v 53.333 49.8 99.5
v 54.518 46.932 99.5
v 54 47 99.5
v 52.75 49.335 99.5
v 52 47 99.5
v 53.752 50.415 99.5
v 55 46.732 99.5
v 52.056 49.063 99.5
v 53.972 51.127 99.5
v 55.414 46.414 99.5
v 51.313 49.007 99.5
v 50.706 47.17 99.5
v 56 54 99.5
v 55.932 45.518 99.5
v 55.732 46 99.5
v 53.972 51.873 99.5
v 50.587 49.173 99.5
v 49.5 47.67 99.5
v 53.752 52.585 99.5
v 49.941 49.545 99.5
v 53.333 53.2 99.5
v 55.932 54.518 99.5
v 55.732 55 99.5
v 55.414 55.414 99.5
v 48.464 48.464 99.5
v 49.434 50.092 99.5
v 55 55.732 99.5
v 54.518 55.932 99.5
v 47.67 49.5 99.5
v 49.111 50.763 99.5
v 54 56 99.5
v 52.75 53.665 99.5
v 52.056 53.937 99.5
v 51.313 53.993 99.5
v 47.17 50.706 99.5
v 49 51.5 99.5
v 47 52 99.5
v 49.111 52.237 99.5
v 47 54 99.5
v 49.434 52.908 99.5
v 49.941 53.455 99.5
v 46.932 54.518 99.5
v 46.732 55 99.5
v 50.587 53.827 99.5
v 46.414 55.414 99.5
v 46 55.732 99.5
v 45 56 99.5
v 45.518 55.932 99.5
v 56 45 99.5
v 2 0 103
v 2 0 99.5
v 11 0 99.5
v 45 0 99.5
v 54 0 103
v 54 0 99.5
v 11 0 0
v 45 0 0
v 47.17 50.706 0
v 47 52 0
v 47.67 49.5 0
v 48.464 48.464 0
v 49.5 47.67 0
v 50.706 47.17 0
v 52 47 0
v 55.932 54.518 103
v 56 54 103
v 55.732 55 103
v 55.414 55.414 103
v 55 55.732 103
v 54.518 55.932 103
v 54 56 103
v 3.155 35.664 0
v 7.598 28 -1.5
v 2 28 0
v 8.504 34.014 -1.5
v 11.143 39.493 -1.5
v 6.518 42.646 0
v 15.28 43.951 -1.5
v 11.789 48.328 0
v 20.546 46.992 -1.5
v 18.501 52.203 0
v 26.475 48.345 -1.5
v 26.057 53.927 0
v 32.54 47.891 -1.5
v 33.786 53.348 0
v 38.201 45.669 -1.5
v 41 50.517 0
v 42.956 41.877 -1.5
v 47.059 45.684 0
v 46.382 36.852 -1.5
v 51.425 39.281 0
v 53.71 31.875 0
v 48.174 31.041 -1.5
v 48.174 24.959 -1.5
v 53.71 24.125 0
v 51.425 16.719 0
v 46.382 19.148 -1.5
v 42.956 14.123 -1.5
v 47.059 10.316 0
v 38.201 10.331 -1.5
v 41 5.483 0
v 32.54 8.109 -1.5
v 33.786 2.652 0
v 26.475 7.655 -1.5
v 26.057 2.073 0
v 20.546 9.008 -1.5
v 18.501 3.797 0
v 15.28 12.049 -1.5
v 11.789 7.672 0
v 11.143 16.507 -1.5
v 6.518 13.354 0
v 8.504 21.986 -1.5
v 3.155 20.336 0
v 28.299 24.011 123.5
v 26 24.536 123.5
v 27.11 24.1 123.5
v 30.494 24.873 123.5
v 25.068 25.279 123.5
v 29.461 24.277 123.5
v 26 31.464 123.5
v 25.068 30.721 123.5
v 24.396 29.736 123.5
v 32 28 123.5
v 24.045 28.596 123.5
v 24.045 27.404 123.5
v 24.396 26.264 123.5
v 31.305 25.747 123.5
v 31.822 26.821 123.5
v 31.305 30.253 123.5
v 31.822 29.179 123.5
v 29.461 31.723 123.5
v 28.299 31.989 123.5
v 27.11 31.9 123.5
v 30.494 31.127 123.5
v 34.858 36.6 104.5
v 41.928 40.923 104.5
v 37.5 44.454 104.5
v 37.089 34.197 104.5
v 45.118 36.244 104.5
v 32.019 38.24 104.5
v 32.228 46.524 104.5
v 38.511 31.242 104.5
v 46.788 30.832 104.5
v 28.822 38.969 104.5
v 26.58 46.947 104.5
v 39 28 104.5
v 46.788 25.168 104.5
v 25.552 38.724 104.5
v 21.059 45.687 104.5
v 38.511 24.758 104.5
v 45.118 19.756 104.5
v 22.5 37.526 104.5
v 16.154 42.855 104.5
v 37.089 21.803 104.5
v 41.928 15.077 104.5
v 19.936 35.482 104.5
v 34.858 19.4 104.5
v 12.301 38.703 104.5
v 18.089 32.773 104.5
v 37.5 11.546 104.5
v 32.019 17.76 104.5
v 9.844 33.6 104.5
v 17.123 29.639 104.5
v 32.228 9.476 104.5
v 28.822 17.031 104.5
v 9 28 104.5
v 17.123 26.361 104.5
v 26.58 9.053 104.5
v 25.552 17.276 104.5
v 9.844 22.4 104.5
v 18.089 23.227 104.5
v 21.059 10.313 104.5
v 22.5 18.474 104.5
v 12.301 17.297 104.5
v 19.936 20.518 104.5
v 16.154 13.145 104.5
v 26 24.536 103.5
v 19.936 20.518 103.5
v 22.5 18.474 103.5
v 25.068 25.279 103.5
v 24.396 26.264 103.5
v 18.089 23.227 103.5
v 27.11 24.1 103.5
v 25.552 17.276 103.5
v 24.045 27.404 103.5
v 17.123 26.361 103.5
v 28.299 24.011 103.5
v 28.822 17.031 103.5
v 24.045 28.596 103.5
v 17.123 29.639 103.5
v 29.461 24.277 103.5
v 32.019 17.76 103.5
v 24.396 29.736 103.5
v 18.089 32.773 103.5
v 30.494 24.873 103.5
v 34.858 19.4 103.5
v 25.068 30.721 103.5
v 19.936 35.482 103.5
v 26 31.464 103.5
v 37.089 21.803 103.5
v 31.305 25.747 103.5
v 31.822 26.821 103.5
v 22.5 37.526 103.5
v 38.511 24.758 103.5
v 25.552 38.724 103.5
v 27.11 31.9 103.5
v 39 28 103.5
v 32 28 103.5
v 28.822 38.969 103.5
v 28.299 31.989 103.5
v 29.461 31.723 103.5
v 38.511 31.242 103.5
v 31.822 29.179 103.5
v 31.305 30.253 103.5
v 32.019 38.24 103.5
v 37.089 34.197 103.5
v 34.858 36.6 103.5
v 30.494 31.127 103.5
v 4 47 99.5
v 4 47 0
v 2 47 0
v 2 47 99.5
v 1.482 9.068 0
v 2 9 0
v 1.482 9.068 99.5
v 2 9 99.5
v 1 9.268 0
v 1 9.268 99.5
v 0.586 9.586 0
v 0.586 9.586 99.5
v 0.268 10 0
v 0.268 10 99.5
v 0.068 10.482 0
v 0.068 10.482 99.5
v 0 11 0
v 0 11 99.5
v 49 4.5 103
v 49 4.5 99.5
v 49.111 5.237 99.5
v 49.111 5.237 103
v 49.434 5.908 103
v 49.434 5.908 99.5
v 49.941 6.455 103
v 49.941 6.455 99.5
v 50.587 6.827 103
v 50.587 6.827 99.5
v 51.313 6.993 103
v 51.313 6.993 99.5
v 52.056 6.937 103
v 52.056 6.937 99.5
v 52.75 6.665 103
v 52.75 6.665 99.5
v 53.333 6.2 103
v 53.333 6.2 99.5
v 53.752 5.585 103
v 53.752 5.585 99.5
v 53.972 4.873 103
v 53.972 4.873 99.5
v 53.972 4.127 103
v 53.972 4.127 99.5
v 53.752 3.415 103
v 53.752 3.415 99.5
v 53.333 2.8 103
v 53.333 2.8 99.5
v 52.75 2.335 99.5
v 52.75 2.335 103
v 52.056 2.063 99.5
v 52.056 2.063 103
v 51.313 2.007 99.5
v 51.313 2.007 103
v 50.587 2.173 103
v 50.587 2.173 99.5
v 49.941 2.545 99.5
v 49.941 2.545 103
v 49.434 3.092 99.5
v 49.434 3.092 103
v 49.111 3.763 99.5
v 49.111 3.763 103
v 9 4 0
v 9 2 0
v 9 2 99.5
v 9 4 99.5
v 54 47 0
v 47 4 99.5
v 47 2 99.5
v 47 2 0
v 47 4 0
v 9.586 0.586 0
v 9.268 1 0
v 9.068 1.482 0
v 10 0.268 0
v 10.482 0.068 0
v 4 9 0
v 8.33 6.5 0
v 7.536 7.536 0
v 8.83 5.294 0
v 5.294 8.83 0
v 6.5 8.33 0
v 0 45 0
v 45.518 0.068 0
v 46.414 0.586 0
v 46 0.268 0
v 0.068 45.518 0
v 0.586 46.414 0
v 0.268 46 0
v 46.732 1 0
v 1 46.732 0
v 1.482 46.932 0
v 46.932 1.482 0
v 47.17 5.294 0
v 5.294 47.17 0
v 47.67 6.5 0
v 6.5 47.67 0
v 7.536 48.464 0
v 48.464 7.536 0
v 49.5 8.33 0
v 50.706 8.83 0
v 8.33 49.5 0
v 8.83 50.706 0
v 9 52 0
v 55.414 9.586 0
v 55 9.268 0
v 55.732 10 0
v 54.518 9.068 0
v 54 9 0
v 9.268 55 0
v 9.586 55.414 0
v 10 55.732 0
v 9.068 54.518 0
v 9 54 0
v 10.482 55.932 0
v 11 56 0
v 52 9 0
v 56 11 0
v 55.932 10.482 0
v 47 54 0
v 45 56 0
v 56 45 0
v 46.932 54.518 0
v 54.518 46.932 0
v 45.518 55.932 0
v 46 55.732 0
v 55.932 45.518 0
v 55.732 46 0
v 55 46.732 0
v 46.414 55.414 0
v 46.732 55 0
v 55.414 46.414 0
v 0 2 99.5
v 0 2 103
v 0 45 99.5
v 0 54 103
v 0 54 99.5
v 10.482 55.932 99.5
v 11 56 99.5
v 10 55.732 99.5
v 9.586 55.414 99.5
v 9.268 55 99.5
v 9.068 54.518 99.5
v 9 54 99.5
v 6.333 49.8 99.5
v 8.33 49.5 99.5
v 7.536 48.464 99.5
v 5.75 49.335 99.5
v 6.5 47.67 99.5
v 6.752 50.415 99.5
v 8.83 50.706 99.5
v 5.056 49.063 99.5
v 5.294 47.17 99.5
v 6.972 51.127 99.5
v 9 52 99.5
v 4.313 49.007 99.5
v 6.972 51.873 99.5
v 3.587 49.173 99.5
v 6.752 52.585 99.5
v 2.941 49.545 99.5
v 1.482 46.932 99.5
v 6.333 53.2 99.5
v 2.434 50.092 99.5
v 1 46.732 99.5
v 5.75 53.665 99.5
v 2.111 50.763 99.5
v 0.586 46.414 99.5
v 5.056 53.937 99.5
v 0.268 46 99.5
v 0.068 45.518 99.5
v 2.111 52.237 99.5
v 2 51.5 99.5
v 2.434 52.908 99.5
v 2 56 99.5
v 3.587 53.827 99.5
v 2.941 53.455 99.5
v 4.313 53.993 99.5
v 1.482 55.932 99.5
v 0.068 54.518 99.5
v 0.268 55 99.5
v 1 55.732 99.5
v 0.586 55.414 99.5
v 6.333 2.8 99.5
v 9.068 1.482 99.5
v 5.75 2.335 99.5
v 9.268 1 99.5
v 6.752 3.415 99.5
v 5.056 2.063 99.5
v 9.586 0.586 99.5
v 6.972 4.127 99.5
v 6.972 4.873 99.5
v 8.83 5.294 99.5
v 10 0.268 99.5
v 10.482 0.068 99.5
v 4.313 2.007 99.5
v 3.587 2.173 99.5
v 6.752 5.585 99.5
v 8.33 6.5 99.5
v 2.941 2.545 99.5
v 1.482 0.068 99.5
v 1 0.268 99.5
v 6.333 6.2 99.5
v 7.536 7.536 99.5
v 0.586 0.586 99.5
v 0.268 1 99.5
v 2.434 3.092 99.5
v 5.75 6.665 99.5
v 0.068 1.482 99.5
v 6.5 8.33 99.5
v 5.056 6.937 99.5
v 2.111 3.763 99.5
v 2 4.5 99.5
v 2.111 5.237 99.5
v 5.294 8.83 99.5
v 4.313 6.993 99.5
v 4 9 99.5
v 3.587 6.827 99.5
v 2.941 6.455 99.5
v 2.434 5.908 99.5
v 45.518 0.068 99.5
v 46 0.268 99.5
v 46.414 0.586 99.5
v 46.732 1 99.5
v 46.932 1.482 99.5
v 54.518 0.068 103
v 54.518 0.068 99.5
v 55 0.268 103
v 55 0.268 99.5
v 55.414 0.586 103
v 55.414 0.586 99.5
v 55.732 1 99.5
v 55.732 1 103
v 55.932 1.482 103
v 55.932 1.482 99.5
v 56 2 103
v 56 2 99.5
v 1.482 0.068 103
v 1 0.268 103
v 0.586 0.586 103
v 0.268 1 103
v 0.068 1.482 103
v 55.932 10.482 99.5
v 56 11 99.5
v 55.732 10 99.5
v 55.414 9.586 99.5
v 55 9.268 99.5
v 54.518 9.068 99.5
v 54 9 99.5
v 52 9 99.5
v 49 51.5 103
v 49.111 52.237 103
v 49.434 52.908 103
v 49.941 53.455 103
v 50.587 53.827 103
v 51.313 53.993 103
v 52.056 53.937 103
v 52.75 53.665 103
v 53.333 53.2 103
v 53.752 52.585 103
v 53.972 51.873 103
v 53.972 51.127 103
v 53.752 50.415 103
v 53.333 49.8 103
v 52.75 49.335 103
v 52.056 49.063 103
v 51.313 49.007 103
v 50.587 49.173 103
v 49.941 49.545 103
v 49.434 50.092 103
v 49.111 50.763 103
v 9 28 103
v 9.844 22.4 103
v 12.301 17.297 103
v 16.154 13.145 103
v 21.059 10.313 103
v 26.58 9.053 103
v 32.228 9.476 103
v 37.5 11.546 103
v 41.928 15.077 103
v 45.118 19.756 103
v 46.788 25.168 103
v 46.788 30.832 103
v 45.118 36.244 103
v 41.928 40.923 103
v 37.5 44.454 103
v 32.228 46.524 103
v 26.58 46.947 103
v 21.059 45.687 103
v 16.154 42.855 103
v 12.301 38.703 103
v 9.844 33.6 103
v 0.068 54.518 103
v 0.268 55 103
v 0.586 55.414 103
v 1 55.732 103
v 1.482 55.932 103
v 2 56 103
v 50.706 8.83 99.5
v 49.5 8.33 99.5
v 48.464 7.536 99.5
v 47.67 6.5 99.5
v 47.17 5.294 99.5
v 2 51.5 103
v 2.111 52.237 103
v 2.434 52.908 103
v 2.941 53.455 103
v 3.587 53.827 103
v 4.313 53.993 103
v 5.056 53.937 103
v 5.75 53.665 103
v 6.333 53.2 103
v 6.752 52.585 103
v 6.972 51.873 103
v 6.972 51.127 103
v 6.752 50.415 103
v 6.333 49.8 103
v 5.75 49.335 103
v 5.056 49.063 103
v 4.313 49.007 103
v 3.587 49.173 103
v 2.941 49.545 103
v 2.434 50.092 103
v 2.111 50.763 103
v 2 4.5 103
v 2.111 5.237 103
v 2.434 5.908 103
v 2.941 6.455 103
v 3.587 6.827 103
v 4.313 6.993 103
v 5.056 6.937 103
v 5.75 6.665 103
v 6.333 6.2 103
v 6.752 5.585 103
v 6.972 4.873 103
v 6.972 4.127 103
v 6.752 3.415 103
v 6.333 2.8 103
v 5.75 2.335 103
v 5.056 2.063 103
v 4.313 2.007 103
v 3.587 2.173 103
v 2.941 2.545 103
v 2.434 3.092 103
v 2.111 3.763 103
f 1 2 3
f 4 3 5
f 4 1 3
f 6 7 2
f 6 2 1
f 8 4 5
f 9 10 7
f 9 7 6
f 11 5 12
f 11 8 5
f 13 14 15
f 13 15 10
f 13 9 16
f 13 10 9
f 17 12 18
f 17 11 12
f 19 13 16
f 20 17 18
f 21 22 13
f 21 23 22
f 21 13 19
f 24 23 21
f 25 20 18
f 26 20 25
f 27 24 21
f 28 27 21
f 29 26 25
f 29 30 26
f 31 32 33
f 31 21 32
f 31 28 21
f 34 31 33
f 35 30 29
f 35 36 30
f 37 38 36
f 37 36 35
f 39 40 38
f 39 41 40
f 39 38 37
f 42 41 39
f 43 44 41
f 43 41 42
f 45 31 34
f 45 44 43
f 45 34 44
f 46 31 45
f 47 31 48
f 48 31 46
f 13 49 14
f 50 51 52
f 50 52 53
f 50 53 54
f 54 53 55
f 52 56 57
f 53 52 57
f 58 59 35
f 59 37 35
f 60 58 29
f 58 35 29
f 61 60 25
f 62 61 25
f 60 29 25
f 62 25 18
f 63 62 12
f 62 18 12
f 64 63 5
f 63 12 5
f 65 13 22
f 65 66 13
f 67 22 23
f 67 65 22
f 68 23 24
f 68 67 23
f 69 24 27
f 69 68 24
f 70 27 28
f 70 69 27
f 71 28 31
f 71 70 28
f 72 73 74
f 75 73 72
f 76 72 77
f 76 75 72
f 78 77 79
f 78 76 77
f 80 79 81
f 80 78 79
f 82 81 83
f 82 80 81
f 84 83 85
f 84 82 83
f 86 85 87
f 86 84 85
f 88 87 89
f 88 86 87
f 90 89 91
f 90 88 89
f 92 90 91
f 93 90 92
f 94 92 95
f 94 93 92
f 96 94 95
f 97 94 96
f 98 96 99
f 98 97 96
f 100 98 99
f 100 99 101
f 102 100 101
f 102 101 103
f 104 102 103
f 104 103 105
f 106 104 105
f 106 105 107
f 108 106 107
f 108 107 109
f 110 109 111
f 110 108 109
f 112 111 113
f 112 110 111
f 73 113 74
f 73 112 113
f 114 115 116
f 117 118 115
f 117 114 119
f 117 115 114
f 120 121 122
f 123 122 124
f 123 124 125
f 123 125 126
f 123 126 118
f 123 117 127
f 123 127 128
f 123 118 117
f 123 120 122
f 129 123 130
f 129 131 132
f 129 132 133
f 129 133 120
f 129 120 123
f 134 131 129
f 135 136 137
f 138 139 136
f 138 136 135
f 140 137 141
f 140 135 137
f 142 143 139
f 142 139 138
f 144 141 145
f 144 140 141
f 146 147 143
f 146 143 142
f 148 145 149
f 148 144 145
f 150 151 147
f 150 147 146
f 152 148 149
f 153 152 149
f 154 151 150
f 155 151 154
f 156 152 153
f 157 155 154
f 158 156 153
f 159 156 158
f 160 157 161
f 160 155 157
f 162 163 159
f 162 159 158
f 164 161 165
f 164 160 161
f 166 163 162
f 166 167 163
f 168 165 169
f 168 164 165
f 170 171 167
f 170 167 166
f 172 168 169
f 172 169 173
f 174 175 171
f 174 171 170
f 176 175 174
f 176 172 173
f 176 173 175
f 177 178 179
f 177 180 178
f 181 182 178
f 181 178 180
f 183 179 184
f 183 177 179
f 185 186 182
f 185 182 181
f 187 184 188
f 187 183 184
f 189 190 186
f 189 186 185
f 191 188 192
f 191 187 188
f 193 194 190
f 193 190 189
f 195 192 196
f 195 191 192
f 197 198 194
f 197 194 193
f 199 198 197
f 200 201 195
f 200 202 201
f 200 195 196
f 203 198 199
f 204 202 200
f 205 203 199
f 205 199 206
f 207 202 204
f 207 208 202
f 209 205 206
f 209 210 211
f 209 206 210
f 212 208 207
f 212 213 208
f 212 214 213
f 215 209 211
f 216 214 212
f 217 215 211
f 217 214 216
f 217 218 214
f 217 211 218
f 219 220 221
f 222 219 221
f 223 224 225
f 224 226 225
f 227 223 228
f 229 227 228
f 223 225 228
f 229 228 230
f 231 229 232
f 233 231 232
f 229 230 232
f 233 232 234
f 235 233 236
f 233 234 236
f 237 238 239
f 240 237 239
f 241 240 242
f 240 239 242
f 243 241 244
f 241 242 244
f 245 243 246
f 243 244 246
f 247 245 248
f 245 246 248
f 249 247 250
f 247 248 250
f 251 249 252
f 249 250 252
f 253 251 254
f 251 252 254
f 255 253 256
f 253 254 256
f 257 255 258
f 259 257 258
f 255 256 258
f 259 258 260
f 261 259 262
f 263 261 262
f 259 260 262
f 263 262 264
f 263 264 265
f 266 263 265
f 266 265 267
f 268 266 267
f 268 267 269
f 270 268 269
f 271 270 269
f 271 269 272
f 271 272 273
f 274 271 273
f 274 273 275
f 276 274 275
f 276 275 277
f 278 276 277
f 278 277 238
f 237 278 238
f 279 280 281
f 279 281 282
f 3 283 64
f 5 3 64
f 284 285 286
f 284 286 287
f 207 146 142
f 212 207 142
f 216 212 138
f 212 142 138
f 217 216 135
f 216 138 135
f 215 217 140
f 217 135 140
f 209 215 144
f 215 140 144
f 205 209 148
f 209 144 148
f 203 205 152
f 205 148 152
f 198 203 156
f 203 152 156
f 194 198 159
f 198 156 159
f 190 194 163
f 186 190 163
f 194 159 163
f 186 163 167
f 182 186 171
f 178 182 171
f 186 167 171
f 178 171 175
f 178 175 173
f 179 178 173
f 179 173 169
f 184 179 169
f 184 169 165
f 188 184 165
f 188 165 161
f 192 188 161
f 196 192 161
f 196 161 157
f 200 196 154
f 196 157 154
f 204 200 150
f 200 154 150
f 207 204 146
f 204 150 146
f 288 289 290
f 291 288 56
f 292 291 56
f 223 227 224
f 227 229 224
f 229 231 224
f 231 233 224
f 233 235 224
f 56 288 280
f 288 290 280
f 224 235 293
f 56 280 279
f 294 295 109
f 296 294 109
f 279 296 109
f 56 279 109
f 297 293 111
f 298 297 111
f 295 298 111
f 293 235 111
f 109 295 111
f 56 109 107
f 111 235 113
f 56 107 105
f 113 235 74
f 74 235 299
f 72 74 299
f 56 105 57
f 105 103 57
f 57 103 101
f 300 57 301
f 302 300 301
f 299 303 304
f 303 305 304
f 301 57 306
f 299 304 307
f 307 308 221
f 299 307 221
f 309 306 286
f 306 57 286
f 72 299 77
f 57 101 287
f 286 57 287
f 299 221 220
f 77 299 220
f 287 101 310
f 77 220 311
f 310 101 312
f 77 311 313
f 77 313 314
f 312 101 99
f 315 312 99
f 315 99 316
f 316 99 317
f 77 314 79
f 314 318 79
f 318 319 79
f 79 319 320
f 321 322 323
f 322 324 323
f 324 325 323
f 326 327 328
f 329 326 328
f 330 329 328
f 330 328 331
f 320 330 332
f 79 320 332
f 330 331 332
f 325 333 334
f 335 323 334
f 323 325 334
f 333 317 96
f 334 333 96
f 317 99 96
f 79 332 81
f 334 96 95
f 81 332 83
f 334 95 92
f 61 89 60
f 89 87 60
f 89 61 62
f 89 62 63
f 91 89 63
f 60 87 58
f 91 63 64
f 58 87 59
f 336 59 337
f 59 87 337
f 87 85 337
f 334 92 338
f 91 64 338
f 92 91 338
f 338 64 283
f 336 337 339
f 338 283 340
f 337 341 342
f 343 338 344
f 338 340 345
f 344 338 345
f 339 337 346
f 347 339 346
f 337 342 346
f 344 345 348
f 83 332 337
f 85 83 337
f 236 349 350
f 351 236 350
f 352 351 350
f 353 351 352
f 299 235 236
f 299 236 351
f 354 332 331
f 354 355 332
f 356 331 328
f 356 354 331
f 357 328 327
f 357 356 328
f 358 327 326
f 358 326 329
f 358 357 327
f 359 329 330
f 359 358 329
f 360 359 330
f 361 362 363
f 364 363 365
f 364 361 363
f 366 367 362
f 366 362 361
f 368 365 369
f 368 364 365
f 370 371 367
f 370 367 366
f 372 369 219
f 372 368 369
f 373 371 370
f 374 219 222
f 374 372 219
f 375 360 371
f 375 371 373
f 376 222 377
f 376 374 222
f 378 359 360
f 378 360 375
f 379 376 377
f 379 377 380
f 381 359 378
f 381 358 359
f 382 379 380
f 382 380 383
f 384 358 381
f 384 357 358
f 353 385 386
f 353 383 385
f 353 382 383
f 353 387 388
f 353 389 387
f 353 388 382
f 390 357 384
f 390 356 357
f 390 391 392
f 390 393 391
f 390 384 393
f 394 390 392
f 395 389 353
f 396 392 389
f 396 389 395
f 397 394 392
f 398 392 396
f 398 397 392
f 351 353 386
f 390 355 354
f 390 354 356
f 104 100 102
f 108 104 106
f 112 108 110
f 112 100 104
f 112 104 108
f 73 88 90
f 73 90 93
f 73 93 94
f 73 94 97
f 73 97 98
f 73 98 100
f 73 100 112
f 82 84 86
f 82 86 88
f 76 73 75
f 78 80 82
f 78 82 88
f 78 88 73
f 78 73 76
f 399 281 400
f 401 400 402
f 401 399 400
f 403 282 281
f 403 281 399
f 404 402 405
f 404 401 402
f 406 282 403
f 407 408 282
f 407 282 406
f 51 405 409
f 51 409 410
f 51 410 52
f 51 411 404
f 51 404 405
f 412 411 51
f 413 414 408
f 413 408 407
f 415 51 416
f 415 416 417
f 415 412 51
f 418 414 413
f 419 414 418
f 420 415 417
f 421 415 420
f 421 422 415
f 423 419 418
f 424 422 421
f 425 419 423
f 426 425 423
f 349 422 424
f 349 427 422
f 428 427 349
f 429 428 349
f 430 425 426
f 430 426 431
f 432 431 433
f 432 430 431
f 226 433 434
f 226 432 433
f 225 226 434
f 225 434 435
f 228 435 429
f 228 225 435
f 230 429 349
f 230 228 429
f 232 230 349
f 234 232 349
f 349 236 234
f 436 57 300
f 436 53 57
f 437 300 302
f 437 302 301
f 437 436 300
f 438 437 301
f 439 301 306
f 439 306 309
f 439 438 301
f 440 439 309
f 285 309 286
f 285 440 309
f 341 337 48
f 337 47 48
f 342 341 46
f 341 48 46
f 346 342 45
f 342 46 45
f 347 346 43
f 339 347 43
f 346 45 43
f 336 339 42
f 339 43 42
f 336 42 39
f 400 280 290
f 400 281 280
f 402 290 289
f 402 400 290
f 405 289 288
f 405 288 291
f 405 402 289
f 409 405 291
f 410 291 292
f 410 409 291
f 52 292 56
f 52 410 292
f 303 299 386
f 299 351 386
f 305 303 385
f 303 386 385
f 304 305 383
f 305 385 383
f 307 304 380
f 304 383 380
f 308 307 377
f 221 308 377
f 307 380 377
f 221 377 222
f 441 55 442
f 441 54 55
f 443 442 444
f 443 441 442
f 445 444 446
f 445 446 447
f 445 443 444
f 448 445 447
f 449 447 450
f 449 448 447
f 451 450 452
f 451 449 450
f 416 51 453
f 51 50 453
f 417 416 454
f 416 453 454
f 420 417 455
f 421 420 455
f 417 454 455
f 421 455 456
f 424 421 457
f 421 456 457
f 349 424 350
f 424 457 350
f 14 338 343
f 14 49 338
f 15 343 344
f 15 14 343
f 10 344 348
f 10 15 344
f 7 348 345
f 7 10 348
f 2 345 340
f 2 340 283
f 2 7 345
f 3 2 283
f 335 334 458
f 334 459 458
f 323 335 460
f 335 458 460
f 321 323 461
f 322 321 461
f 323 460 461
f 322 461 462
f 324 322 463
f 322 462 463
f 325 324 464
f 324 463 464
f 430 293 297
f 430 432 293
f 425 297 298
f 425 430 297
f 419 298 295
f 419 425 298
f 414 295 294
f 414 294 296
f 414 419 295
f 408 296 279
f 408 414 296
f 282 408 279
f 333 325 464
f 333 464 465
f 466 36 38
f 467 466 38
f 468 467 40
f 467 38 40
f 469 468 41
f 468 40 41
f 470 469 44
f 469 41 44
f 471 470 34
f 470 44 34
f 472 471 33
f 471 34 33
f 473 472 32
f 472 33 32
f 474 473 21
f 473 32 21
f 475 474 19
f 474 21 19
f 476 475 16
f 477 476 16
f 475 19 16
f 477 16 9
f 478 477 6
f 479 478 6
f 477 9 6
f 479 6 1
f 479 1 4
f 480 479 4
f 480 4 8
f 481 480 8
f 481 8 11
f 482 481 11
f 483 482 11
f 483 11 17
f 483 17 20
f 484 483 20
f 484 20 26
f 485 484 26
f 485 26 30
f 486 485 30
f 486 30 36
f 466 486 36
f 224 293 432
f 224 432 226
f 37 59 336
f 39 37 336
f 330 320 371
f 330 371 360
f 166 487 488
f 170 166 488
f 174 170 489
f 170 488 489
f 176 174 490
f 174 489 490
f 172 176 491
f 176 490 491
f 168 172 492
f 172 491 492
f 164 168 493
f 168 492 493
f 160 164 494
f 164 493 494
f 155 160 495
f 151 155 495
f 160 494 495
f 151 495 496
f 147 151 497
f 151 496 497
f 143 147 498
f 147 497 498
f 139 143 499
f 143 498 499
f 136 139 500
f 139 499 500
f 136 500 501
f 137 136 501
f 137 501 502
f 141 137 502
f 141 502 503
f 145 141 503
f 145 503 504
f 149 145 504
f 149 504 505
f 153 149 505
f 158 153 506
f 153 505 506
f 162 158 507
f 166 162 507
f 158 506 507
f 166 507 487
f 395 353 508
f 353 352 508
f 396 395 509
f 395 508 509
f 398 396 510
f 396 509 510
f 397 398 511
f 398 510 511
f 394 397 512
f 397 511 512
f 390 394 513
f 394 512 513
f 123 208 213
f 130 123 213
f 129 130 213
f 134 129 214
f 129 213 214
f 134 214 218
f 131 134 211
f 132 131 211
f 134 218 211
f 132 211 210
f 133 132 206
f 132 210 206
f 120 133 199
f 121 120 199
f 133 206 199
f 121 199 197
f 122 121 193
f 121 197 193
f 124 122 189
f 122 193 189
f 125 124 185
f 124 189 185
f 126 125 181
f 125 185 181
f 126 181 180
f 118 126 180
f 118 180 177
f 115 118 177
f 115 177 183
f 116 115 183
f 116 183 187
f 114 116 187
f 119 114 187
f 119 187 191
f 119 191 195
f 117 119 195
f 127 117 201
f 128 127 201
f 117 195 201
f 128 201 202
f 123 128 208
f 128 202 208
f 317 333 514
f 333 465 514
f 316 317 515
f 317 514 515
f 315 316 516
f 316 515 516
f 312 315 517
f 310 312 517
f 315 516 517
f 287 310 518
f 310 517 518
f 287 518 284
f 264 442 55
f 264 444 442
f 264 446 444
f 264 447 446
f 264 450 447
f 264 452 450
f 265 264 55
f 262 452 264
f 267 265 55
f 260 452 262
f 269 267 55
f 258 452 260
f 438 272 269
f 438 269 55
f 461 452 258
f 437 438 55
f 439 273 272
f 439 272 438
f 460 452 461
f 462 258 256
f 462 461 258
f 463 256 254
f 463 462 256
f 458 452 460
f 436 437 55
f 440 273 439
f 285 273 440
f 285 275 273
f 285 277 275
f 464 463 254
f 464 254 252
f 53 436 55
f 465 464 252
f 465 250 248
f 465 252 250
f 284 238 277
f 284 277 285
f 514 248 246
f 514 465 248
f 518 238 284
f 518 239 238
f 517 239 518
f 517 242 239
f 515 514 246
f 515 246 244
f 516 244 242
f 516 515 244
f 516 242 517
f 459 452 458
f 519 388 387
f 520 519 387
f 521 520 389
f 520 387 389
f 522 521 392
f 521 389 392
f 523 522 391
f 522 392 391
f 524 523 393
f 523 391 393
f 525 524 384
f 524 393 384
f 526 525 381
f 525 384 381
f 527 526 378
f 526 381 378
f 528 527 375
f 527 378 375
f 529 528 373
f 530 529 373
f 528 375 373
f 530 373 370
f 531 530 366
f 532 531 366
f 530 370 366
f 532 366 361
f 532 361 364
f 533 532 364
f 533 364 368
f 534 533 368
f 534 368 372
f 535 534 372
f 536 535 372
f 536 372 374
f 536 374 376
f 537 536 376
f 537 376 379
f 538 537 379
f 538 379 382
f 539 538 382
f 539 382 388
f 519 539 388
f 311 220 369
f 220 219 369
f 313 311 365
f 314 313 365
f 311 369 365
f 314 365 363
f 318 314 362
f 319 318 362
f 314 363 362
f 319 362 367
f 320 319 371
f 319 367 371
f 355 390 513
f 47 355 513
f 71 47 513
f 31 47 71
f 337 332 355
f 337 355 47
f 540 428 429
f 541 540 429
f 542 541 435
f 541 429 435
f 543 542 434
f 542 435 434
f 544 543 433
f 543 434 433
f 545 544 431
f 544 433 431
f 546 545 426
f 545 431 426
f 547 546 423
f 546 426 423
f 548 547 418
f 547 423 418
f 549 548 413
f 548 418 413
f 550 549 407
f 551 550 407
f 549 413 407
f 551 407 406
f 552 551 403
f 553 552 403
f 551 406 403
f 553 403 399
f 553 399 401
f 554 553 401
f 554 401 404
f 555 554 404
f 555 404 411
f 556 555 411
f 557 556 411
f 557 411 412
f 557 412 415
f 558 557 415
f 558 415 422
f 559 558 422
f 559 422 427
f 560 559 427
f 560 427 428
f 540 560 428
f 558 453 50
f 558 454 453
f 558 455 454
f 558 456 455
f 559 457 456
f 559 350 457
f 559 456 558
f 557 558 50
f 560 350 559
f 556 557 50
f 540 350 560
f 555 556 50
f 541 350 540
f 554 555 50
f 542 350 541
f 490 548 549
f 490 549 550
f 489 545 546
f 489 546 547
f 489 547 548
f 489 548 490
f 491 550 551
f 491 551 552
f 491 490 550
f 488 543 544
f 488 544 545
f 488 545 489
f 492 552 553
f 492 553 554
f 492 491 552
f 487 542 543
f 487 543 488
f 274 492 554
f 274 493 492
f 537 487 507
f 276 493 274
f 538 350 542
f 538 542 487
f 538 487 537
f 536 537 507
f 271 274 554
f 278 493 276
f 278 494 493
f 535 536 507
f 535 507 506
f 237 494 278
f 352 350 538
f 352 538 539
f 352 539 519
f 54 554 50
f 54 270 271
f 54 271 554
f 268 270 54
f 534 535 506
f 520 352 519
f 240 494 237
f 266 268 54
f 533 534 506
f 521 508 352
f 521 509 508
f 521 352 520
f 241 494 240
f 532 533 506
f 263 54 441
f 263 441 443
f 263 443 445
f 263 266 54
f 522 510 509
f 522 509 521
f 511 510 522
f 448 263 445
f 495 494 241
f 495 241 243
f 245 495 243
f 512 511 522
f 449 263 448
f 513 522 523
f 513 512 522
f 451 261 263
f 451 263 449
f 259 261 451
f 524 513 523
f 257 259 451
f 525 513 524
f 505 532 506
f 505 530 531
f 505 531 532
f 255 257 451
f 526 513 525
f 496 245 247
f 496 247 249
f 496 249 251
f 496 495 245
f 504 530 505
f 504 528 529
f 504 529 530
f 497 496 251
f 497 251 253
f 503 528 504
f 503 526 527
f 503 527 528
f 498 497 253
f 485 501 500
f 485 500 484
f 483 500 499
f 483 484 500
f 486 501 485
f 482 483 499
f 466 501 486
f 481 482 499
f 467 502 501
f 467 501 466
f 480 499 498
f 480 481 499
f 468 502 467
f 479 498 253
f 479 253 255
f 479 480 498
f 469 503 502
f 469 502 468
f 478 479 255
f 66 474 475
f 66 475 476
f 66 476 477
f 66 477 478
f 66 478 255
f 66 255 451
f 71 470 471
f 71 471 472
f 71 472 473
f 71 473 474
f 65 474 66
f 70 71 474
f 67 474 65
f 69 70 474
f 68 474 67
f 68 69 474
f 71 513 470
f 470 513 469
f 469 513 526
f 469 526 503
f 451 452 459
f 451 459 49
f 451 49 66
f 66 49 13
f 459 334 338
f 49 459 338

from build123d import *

# Parameters (mm, degrees)
SKETCH_1_W                = 56
SKETCH_1_H                = 56
EXTRUDE_1_DEPTH           = 103
SKETCH_2_W                = 9
SKETCH_2_H                = 9
CUT_EXTRUDE_1_DEPTH       = 99.5
HOLE_WIZARD_5_0_5_1_D     = 5
HOLE_WIZARD_5_0_5_1_DEPTH = 10
HOLE_WIZARD_5_0_5_1_TIP   = 1.502151548
FILLET_2_R                = 5
SKETCH_5_R                = 19
EXTRUDE_2_DEPTH           = 1.5
SKETCH_6_R                = 11
CUT_EXTRUDE_2_DEPTH       = 1
SKETCH_7_R                = 4
EXTRUDE_3_DEPTH           = 20
FILLET_3_R                = 2
SKETCH_8_R                = 26
EXTRUDE_4_DEPTH           = 1.5
CHAMFER_1_SIZE2           = 5.598076211
CHAMFER_1_SIZE            = 1.5


with BuildPart() as part:
    # 草图1 → 凸台-拉伸1 (new body)
    with BuildSketch(Plane.XY):
        with Locations((28, 28)):
            Rectangle(SKETCH_1_W, SKETCH_1_H)
    extrude(amount=EXTRUDE_1_DEPTH)

    # 草图2 → 切除-拉伸1 (cut)
    with BuildSketch(Plane(origin=(0, 0, 0), x_dir=(-1, 0, 0), z_dir=(0, 0, -1))):
        with Locations((-51.5, 4.5)):
            Rectangle(SKETCH_2_W, SKETCH_2_H)
        with Locations((-51.5, 51.5)):
            Rectangle(SKETCH_2_W, SKETCH_2_H)
        with Locations((-4.5, 51.5)):
            Rectangle(SKETCH_2_W, SKETCH_2_H)
        with Locations((-4.5, 4.5)):
            Rectangle(SKETCH_2_W, SKETCH_2_H)
    extrude(amount=-CUT_EXTRUDE_1_DEPTH, mode=Mode.SUBTRACT)

    # Ø5.0 (5) 直径孔1
    with Locations(Plane.XY.offset(103)):
        with Locations((4.5, 51.5), (51.5, 51.5), (51.5, 4.5), (4.5, 4.5)):
            Hole(HOLE_WIZARD_5_0_5_1_D / 2, depth=HOLE_WIZARD_5_0_5_1_DEPTH)
            with Locations((0, 0, -(HOLE_WIZARD_5_0_5_1_DEPTH + HOLE_WIZARD_5_0_5_1_TIP / 2))):  # 118° drill point
                Cone(0, HOLE_WIZARD_5_0_5_1_D / 2, HOLE_WIZARD_5_0_5_1_TIP, mode=Mode.SUBTRACT)

    # 圆角2
    fillet_2_edges = [part.edges().sort_by_distance(p)[0] for p in [
        (47, 9, 49.75),
        (47, 47, 49.75),
        (9, 47, 49.75),
        (9, 9, 49.75),
    ]]
    fillet(fillet_2_edges, radius=FILLET_2_R)

    # 草图5 → 凸台-拉伸2 (add)
    with BuildSketch(Plane.XY.offset(103)):
        with Locations(Location((28, 28, 0), (0, 0, 180))):
            Circle(SKETCH_5_R)
    extrude(amount=EXTRUDE_2_DEPTH)

    # 草图6 → 切除-拉伸2 (cut)
    with BuildSketch(Plane.XY.offset(104.5)):
        with Locations((28, 28)):
            Circle(SKETCH_6_R)
    extrude(amount=-CUT_EXTRUDE_2_DEPTH, mode=Mode.SUBTRACT)

    # 草图7 → 凸台-拉伸3 (add)
    with BuildSketch(Plane.XY.offset(103.5)):
        with Locations((28, 28)):
            Circle(SKETCH_7_R)
    extrude(amount=EXTRUDE_3_DEPTH)

    # 圆角3
    fillet_3_edges = [part.edges().sort_by_distance(p)[0] for p in [
        (56, 9, 49.75),
        (47, 0, 49.75),
        (56, 47, 49.75),
        (47, 56, 49.75),
        (0, 47, 49.75),
        (9, 56, 49.75),
        (0, 9, 49.75),
        (9, 0, 49.75),
        (0, 56, 101.25),
        (56, 56, 101.25),
        (56, 0, 101.25),
        (0, 0, 101.25),
    ]]
    fillet(fillet_3_edges, radius=FILLET_3_R)

    # 草图8 → 凸台-拉伸4 (add)
    with BuildSketch(Plane(origin=(0, 0, 0), x_dir=(-1, 0, 0), z_dir=(0, 0, -1))):
        with Locations((-28, 28)):
            Circle(SKETCH_8_R)
    extrude(amount=EXTRUDE_4_DEPTH)

    # 倒角1
    chamfer_1_edges = [part.edges().sort_by_distance(p)[0] for p in [
        (54, 28, -1.5),
    ]]
    chamfer_1_side = [part.faces().sort_by_distance(p)[0] for p in [
        (54, 28, -1.47),
    ]]
    chamfer(chamfer_1_edges, length=CHAMFER_1_SIZE - 0.0001, length2=CHAMFER_1_SIZE2 - 0.0001, reference=chamfer_1_side[0])  # a hair under: the kernel refuses the full size


solid = part.part
